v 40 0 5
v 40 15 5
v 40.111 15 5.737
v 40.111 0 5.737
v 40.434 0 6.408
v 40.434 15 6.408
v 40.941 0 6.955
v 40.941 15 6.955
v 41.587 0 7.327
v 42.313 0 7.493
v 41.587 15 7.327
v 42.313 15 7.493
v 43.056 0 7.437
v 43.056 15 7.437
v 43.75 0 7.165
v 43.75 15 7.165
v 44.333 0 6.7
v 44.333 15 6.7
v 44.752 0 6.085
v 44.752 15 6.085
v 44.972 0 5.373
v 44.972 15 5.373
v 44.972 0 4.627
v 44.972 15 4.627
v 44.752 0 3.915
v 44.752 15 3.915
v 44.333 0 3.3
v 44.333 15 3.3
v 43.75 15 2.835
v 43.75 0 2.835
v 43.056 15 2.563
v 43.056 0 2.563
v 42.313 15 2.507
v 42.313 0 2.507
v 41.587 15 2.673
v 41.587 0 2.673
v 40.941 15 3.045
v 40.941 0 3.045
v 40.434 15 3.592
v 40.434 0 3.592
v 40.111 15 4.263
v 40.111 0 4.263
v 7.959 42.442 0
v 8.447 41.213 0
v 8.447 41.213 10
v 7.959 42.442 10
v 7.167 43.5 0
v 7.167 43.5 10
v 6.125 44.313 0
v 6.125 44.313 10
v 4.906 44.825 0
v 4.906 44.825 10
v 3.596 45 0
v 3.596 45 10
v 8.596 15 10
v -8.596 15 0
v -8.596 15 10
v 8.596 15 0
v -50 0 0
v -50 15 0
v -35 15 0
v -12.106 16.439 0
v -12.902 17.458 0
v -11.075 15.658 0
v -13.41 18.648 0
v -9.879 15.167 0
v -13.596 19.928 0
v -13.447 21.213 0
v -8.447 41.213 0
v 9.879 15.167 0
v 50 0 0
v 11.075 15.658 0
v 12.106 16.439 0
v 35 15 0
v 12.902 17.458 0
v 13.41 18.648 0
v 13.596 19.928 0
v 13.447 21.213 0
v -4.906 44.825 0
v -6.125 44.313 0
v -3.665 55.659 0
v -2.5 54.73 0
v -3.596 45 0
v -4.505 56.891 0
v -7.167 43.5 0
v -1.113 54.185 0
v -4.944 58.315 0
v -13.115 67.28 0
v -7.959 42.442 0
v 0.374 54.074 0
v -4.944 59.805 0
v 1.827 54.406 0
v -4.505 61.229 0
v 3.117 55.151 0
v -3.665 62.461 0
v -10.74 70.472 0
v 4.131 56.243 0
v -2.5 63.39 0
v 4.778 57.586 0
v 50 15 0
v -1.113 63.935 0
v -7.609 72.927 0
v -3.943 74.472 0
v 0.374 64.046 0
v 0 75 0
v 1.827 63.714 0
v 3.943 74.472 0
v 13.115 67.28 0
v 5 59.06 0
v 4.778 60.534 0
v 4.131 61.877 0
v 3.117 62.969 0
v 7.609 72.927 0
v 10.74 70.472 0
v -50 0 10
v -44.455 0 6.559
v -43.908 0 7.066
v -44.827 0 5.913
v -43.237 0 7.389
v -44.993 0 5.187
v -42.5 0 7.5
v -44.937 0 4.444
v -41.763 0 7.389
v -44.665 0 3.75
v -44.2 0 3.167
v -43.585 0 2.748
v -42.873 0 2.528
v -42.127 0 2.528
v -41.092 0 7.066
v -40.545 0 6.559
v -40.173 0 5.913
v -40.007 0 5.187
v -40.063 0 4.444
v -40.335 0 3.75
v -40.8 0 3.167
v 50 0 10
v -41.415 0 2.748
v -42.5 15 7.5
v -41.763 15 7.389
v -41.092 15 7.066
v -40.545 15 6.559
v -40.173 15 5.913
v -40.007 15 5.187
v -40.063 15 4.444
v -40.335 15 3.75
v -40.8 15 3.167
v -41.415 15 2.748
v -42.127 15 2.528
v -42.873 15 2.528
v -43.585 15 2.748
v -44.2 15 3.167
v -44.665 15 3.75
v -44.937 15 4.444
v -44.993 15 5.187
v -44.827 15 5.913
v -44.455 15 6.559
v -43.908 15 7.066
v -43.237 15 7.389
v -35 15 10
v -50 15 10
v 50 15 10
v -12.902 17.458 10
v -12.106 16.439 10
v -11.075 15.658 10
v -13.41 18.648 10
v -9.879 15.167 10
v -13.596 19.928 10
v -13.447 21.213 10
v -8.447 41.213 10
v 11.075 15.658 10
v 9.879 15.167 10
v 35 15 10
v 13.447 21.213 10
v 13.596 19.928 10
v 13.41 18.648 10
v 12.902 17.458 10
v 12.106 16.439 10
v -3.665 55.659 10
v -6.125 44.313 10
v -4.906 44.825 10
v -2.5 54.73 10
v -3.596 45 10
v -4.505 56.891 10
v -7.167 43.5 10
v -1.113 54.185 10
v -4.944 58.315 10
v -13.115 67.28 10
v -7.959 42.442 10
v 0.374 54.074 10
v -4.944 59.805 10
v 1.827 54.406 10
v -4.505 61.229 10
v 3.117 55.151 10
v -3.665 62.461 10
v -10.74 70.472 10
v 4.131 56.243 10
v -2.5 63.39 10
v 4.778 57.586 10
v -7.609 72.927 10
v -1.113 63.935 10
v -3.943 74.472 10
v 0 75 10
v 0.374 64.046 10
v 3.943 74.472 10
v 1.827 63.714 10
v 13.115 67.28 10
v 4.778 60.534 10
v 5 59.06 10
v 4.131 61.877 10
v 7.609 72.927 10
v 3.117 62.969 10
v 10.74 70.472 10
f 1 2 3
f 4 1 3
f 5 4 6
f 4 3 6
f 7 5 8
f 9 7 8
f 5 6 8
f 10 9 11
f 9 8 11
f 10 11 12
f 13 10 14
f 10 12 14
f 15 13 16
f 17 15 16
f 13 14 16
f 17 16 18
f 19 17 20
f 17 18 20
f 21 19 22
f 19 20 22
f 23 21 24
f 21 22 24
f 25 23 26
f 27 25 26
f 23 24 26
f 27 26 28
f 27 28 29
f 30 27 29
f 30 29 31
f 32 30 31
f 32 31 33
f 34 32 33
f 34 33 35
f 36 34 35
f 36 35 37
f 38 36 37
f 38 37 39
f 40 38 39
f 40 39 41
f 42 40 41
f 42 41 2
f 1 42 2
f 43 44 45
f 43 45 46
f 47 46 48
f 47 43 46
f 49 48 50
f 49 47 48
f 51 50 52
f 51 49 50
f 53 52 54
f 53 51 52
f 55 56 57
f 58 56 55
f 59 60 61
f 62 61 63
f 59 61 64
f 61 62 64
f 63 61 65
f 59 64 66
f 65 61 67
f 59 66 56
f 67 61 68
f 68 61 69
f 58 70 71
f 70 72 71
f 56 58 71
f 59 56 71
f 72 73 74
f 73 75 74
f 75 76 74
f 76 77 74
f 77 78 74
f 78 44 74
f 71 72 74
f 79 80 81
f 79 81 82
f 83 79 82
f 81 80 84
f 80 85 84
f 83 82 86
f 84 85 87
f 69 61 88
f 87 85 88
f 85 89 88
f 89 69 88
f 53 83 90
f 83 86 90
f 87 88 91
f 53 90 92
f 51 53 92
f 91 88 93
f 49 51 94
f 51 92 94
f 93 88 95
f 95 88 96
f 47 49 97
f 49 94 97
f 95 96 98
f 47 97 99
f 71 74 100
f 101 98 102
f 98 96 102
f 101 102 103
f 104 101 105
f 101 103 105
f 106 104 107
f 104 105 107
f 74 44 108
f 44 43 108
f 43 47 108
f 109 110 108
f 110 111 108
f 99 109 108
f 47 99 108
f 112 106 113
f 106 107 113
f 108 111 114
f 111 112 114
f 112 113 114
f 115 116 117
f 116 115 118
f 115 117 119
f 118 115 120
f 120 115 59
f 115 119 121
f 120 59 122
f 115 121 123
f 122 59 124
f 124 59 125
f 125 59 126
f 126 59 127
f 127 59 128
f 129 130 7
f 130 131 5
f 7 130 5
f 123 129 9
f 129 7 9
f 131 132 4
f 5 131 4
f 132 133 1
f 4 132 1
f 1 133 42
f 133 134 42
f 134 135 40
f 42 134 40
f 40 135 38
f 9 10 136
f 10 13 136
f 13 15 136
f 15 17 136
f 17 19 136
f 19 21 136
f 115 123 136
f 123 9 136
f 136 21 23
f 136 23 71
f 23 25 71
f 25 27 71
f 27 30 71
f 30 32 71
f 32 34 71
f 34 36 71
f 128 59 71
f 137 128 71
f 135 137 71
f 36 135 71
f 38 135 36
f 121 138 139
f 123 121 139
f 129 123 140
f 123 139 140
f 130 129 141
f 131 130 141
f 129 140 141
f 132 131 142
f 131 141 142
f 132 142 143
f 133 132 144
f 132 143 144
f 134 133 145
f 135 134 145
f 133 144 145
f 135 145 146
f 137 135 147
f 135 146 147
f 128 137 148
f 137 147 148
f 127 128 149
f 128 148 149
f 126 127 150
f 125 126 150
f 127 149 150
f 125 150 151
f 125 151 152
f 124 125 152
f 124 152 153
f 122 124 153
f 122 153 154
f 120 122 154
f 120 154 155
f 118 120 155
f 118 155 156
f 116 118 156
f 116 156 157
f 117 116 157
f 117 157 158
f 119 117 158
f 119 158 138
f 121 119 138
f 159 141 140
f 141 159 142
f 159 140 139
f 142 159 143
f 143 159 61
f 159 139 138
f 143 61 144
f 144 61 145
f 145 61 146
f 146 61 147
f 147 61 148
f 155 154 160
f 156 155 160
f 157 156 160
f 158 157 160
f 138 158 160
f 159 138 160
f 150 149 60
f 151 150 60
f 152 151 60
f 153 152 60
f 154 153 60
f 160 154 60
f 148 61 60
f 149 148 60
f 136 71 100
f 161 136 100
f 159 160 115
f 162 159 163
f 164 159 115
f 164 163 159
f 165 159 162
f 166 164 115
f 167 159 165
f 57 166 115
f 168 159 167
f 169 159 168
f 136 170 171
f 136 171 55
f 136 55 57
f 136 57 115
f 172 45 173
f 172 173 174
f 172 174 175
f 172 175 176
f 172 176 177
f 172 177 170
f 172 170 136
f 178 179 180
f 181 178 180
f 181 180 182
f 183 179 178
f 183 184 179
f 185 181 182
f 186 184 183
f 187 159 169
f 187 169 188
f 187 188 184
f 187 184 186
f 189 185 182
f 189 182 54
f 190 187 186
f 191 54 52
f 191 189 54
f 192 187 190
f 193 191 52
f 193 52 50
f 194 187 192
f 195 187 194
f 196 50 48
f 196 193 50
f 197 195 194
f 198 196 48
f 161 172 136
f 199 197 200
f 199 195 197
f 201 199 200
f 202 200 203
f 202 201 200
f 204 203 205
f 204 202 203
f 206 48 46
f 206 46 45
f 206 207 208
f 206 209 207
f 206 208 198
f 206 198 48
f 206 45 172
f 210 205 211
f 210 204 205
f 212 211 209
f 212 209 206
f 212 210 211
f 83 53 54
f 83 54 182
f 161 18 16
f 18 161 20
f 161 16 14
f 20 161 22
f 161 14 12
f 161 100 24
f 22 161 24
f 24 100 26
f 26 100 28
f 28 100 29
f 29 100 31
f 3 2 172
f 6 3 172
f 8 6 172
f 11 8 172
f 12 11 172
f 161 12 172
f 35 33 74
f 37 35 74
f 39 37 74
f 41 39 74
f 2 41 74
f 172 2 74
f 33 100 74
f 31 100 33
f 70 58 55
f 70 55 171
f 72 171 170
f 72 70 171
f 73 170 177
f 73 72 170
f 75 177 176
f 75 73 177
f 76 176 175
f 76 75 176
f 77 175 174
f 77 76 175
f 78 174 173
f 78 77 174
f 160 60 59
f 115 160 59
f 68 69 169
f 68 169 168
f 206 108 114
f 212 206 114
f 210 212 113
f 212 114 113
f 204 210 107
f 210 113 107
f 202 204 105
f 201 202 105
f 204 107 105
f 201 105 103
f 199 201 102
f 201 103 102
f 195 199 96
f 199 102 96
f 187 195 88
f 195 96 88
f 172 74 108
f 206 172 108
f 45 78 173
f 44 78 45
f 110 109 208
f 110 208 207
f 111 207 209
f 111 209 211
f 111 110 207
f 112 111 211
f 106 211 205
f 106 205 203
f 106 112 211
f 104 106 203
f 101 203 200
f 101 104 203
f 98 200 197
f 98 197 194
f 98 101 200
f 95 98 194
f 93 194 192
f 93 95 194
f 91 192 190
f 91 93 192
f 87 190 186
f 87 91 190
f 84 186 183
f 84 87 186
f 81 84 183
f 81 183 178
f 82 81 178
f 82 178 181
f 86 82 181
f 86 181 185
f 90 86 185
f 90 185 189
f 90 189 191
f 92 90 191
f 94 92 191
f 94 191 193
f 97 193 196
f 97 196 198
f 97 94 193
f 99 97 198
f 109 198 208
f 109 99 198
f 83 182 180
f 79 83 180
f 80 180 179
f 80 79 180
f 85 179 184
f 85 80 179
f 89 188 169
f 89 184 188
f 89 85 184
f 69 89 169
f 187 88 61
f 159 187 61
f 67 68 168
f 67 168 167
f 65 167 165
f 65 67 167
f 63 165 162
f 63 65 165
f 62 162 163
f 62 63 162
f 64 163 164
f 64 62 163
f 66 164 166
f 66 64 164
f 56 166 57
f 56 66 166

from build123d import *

# Parameters (mm, degrees)
SKETCH1_R           = 5
BOSS_EXTRUDE2_DEPTH = 10
CUT_EXTRUDE1_DEPTH  = 25
SKETCH4_R           = 2.5
CUT_EXTRUDE2_DEPTH  = 38


with BuildPart() as part:
    # Sketch1 → Boss-Extrude2 (new body)
    with BuildSketch(Plane.XY):
        with BuildLine():
            Line((35, 15), (13.114987511, 67.279910892))
            ThreePointArc((13.114987511, 67.279910892), (0, 75), (-13.114987511, 67.279910892))
            Line((-13.114987511, 67.279910892), (-35, 15))
            Line((-35, 15), (-50, 15))
            Line((-50, 15), (-50, 0))
            Line((-50, 0), (-35, 0))
            Line((-35, 0), (35, 0))
            Line((35, 0), (50, 0))
            Line((50, 0), (50, 15))
            Line((50, 15), (35, 15))
        make_face()
        with Locations((0, 59.06)):
            Circle(SKETCH1_R, mode=Mode.SUBTRACT)
    extrude(amount=BOSS_EXTRUDE2_DEPTH)

    # Sketch3 → Cut-Extrude1 (cut)
    with BuildSketch(Plane(origin=(0, 0, 0), x_dir=(-1, 0, 0), z_dir=(0, 0, -1))):
        with BuildLine():
            Line((0, 15), (-8.596117968, 15))
            ThreePointArc((-8.596117968, 15), (-12.537145158, 16.922938953), (-13.446830469, 21.212678125))
            Line((-13.446830469, 21.212678125), (-8.446830469, 41.212678125))
            ThreePointArc((-8.446830469, 41.212678125), (-6.673179015, 43.94102719), (-3.596117968, 45))
            Line((-3.596117968, 45), (0, 45))
            Line((0, 45), (3.596117968, 45))
            ThreePointArc((3.596117968, 45), (6.673179015, 43.94102719), (8.446830469, 41.212678125))
            Line((8.446830469, 41.212678125), (13.446830469, 21.212678125))
            ThreePointArc((13.446830469, 21.212678125), (12.537145158, 16.922938953), (8.596117968, 15))
            Line((8.596117968, 15), (0, 15))
        make_face()
    extrude(amount=-CUT_EXTRUDE1_DEPTH, mode=Mode.SUBTRACT)

    # Sketch4 → Cut-Extrude2 (cut)
    with BuildSketch(Plane(origin=(0, 15, 0), x_dir=(1, 0, 0), z_dir=(0, 1, 0))):
        with Locations(Location((-42.5, -5, 0), (0, 0, 270))):
            Circle(SKETCH4_R)
        with Locations(Location((42.5, -5, 0), (0, 0, 180))):
            Circle(SKETCH4_R)
    extrude(amount=-CUT_EXTRUDE2_DEPTH, mode=Mode.SUBTRACT)


solid = part.part
